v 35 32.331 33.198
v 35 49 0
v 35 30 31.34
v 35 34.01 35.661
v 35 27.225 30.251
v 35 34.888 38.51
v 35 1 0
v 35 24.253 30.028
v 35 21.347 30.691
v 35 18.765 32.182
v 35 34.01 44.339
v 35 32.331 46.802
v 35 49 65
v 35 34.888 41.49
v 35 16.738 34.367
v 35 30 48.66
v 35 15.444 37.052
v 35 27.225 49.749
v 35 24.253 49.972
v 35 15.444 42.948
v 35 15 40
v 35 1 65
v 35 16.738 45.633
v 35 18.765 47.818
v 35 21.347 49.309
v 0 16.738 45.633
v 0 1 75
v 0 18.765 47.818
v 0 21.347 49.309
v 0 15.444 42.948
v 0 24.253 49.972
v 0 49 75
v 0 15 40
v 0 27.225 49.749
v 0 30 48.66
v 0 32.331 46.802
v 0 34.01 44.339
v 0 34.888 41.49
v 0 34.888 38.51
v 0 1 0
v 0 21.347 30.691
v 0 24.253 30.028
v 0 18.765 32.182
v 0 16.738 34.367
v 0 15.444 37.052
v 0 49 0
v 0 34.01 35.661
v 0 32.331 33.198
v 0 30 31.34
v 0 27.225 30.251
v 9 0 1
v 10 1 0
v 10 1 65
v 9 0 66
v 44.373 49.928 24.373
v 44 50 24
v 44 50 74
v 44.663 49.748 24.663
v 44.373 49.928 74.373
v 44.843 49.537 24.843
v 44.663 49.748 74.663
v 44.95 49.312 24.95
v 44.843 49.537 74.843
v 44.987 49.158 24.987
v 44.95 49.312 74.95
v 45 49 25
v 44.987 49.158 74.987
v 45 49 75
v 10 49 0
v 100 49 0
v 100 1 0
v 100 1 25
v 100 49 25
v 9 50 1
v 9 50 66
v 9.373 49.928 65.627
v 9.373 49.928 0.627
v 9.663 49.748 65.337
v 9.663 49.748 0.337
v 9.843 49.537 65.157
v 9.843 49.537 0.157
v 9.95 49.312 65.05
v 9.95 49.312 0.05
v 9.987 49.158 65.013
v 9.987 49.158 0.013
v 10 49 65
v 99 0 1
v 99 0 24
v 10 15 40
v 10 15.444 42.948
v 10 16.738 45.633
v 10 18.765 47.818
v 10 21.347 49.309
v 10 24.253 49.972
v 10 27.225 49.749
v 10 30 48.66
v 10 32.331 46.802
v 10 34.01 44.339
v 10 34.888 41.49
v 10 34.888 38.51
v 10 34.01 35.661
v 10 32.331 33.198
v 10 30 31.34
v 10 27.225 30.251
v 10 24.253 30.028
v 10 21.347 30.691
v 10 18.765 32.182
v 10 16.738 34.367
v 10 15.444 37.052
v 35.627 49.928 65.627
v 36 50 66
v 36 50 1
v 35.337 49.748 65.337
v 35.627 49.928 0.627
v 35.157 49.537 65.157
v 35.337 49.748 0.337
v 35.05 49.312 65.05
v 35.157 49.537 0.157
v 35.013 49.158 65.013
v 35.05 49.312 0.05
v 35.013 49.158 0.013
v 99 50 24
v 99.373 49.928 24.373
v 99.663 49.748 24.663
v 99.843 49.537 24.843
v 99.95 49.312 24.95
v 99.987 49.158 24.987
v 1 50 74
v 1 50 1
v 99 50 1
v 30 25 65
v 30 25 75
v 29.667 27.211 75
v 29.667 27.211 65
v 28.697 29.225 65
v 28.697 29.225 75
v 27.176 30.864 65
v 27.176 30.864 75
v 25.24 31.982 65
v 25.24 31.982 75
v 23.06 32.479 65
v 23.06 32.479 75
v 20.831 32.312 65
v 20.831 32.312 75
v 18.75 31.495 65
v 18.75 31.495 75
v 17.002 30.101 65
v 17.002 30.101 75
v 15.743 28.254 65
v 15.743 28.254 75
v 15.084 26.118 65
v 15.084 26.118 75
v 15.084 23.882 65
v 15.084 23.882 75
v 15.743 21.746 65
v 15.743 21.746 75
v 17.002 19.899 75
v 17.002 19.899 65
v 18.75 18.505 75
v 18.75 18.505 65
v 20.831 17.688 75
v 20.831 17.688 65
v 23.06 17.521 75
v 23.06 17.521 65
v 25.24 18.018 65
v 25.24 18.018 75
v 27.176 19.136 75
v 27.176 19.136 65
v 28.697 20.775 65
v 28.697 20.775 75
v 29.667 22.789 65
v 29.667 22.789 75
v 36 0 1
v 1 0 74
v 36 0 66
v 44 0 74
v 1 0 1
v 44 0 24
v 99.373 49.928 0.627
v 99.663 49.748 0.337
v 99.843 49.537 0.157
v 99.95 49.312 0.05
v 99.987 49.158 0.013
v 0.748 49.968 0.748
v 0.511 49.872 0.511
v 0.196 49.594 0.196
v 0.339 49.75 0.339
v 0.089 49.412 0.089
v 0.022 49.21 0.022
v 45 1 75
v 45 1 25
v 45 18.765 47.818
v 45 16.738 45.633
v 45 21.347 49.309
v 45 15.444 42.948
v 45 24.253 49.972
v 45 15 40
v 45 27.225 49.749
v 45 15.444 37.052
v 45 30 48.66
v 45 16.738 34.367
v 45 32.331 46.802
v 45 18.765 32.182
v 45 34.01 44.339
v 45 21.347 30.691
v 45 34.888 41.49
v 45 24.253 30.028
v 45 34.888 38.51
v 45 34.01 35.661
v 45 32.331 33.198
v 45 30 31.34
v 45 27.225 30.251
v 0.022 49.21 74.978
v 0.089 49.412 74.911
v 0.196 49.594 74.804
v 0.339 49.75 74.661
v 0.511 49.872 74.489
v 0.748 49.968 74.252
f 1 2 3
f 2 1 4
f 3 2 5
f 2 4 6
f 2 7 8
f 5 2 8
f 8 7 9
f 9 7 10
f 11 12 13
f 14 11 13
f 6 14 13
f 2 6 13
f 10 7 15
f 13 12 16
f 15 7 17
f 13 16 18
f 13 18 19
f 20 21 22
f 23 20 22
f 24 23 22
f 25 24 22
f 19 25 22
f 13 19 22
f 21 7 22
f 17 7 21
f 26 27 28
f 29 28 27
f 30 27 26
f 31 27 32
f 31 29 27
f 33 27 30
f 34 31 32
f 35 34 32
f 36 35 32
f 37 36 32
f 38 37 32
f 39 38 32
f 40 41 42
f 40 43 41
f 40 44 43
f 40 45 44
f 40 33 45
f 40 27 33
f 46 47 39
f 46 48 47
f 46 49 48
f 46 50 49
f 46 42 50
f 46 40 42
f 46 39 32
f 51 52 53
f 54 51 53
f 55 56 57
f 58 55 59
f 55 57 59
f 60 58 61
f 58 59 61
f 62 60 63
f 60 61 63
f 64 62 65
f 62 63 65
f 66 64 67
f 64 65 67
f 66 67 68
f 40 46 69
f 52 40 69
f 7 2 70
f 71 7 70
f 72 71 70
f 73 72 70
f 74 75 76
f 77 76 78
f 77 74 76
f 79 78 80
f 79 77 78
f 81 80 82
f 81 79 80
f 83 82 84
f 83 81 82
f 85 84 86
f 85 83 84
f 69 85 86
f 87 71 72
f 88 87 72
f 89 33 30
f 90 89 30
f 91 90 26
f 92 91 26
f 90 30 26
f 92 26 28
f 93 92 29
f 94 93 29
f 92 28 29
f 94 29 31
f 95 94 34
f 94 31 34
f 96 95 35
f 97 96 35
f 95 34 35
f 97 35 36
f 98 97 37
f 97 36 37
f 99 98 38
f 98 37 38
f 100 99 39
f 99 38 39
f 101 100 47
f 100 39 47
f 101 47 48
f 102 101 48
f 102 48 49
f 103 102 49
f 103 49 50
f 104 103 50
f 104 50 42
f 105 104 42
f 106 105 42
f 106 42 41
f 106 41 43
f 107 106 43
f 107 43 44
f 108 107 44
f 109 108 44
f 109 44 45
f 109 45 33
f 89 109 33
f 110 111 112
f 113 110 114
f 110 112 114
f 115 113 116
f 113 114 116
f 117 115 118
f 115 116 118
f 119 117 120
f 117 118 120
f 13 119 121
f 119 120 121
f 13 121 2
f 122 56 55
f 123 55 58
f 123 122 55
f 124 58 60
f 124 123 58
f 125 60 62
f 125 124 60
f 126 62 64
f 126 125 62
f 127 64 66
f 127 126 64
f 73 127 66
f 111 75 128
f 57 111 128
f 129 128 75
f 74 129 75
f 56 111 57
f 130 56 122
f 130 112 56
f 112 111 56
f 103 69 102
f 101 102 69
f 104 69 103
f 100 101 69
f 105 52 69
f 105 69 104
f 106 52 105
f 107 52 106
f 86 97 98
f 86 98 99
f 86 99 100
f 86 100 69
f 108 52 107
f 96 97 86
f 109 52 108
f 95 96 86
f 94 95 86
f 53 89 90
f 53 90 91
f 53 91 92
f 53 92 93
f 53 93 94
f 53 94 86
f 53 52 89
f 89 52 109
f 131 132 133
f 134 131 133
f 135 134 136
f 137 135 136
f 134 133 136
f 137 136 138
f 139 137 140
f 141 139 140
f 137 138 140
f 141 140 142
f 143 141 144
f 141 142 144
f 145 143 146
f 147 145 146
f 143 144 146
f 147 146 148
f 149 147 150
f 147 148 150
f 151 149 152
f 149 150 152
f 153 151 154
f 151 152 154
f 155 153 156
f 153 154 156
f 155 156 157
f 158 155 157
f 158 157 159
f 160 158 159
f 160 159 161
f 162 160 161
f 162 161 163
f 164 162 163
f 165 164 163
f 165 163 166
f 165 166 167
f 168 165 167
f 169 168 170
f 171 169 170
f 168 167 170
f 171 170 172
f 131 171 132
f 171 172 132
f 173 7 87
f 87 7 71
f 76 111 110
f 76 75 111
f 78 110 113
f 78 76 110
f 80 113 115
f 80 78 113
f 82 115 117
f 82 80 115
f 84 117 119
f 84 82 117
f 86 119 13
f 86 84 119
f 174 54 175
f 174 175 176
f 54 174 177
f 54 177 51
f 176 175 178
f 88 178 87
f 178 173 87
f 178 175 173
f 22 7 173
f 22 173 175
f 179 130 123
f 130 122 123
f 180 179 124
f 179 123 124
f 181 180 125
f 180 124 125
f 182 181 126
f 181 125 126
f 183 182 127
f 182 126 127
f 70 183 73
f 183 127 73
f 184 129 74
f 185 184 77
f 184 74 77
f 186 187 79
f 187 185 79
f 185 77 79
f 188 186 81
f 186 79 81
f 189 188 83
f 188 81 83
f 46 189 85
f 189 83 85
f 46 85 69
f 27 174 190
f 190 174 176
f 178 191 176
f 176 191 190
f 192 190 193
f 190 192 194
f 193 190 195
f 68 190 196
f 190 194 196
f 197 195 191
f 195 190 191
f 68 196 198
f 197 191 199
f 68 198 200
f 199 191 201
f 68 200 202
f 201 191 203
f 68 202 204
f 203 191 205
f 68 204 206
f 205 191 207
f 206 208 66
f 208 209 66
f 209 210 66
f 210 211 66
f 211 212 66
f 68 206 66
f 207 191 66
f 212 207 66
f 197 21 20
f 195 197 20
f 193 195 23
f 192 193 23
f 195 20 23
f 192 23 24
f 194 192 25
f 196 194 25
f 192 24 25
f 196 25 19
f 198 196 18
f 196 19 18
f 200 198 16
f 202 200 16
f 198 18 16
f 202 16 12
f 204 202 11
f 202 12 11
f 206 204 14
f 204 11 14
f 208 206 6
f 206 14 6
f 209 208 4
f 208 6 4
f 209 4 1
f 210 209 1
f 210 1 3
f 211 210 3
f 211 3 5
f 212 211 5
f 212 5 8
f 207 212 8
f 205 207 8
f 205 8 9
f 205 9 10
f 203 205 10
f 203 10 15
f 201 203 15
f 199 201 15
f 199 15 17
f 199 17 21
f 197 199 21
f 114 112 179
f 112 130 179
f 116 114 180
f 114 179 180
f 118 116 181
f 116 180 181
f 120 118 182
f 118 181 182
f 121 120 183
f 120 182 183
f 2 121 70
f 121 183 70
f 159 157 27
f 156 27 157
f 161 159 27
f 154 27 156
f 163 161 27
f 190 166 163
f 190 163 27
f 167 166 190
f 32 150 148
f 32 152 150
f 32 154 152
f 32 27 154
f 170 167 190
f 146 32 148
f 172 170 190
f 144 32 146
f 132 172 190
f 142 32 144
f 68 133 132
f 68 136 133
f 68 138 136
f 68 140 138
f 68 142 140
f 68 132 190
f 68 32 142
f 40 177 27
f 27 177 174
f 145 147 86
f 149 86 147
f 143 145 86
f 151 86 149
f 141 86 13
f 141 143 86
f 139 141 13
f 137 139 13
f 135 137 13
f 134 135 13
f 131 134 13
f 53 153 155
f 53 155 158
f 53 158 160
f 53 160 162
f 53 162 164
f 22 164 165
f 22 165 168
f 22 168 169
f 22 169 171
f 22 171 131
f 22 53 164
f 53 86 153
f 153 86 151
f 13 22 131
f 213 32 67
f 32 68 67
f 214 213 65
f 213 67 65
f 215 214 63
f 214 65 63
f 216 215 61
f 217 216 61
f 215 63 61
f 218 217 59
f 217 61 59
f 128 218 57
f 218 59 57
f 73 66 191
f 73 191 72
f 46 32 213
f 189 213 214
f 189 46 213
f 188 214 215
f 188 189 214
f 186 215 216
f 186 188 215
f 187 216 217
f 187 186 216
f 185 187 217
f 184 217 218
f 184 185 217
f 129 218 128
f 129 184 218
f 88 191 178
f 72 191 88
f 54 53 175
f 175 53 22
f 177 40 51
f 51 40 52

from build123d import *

# Parameters (mm, degrees)
F0_W     = 100
F0_H     = 50
F1_DEPTH = 25
F2_W     = 45
F2_H     = 50
F3_DEPTH = 50
F4_W     = 25
F4_H     = 65
F5_DEPTH = 50.001
F6_R     = 10
F7_DEPTH = 100.001
F8_R     = 7.5
F9_DEPTH = 10
F10_SIZE = 1
F11_R    = 1


with BuildPart() as f1:
    # F0 (on Top) → F1 (new body)
    with BuildSketch(Plane.XY):
        with Locations((50, 25)):
            Rectangle(F0_W, F0_H)
    extrude(amount=F1_DEPTH)

    # F2 (on face) → F3 (join)
    with BuildSketch(Plane.XY.offset(25)):
        with Locations((22.5, 25)):
            Rectangle(F2_W, F2_H)
    extrude(amount=F3_DEPTH)

    # F4 (on face) → F5 (cut, through all)
    with BuildSketch(Plane.XZ):
        with Locations((22.5, 32.5)):
            Rectangle(F4_W, F4_H)
    extrude(amount=-F5_DEPTH, mode=Mode.SUBTRACT)

    # F6 (on face) → F7 (cut, through all)
    with BuildSketch(Plane(origin=(0, 0, 0), x_dir=(0, -1, 0), z_dir=(-1, 0, 0))):
        with Locations((-25, 40)):
            Circle(F6_R)
    extrude(amount=-F7_DEPTH, mode=Mode.SUBTRACT)

    # F8 (on face) → F9 (cut, through all)
    with BuildSketch(Plane.XY.offset(75)):
        with Locations((22.5, 25)):
            Circle(F8_R)
    extrude(amount=-F9_DEPTH, mode=Mode.SUBTRACT)

    # F10
    f10_edges = [f1.edges().sort_by_distance(p)[0] for p in [
        (0, 0, 37.5),
        (35, 0, 32.5),
        (22.5, 0, 65),
        (5, 0, 0),
        (10, 0, 32.5),
        (67.5, 0, 0),
        (100, 0, 12.5),
        (72.5, 0, 25),
        (45, 0, 50),
        (22.5, 0, 75),
    ]]
    chamfer(f10_edges, length=F10_SIZE)

    # F11
    f11_edges = [f1.edges().sort_by_distance(p)[0] for p in [
        (72.5, 50, 25),
        (45, 50, 50),
        (22.5, 50, 75),
        (0, 50, 37.5),
        (67.5, 50, 0),
        (35, 50, 32.5),
        (22.5, 50, 65),
        (10, 50, 32.5),
        (5, 50, 0),
        (100, 50, 12.5),
    ]]
    fillet(f11_edges, radius=F11_R)


solid = f1.part
